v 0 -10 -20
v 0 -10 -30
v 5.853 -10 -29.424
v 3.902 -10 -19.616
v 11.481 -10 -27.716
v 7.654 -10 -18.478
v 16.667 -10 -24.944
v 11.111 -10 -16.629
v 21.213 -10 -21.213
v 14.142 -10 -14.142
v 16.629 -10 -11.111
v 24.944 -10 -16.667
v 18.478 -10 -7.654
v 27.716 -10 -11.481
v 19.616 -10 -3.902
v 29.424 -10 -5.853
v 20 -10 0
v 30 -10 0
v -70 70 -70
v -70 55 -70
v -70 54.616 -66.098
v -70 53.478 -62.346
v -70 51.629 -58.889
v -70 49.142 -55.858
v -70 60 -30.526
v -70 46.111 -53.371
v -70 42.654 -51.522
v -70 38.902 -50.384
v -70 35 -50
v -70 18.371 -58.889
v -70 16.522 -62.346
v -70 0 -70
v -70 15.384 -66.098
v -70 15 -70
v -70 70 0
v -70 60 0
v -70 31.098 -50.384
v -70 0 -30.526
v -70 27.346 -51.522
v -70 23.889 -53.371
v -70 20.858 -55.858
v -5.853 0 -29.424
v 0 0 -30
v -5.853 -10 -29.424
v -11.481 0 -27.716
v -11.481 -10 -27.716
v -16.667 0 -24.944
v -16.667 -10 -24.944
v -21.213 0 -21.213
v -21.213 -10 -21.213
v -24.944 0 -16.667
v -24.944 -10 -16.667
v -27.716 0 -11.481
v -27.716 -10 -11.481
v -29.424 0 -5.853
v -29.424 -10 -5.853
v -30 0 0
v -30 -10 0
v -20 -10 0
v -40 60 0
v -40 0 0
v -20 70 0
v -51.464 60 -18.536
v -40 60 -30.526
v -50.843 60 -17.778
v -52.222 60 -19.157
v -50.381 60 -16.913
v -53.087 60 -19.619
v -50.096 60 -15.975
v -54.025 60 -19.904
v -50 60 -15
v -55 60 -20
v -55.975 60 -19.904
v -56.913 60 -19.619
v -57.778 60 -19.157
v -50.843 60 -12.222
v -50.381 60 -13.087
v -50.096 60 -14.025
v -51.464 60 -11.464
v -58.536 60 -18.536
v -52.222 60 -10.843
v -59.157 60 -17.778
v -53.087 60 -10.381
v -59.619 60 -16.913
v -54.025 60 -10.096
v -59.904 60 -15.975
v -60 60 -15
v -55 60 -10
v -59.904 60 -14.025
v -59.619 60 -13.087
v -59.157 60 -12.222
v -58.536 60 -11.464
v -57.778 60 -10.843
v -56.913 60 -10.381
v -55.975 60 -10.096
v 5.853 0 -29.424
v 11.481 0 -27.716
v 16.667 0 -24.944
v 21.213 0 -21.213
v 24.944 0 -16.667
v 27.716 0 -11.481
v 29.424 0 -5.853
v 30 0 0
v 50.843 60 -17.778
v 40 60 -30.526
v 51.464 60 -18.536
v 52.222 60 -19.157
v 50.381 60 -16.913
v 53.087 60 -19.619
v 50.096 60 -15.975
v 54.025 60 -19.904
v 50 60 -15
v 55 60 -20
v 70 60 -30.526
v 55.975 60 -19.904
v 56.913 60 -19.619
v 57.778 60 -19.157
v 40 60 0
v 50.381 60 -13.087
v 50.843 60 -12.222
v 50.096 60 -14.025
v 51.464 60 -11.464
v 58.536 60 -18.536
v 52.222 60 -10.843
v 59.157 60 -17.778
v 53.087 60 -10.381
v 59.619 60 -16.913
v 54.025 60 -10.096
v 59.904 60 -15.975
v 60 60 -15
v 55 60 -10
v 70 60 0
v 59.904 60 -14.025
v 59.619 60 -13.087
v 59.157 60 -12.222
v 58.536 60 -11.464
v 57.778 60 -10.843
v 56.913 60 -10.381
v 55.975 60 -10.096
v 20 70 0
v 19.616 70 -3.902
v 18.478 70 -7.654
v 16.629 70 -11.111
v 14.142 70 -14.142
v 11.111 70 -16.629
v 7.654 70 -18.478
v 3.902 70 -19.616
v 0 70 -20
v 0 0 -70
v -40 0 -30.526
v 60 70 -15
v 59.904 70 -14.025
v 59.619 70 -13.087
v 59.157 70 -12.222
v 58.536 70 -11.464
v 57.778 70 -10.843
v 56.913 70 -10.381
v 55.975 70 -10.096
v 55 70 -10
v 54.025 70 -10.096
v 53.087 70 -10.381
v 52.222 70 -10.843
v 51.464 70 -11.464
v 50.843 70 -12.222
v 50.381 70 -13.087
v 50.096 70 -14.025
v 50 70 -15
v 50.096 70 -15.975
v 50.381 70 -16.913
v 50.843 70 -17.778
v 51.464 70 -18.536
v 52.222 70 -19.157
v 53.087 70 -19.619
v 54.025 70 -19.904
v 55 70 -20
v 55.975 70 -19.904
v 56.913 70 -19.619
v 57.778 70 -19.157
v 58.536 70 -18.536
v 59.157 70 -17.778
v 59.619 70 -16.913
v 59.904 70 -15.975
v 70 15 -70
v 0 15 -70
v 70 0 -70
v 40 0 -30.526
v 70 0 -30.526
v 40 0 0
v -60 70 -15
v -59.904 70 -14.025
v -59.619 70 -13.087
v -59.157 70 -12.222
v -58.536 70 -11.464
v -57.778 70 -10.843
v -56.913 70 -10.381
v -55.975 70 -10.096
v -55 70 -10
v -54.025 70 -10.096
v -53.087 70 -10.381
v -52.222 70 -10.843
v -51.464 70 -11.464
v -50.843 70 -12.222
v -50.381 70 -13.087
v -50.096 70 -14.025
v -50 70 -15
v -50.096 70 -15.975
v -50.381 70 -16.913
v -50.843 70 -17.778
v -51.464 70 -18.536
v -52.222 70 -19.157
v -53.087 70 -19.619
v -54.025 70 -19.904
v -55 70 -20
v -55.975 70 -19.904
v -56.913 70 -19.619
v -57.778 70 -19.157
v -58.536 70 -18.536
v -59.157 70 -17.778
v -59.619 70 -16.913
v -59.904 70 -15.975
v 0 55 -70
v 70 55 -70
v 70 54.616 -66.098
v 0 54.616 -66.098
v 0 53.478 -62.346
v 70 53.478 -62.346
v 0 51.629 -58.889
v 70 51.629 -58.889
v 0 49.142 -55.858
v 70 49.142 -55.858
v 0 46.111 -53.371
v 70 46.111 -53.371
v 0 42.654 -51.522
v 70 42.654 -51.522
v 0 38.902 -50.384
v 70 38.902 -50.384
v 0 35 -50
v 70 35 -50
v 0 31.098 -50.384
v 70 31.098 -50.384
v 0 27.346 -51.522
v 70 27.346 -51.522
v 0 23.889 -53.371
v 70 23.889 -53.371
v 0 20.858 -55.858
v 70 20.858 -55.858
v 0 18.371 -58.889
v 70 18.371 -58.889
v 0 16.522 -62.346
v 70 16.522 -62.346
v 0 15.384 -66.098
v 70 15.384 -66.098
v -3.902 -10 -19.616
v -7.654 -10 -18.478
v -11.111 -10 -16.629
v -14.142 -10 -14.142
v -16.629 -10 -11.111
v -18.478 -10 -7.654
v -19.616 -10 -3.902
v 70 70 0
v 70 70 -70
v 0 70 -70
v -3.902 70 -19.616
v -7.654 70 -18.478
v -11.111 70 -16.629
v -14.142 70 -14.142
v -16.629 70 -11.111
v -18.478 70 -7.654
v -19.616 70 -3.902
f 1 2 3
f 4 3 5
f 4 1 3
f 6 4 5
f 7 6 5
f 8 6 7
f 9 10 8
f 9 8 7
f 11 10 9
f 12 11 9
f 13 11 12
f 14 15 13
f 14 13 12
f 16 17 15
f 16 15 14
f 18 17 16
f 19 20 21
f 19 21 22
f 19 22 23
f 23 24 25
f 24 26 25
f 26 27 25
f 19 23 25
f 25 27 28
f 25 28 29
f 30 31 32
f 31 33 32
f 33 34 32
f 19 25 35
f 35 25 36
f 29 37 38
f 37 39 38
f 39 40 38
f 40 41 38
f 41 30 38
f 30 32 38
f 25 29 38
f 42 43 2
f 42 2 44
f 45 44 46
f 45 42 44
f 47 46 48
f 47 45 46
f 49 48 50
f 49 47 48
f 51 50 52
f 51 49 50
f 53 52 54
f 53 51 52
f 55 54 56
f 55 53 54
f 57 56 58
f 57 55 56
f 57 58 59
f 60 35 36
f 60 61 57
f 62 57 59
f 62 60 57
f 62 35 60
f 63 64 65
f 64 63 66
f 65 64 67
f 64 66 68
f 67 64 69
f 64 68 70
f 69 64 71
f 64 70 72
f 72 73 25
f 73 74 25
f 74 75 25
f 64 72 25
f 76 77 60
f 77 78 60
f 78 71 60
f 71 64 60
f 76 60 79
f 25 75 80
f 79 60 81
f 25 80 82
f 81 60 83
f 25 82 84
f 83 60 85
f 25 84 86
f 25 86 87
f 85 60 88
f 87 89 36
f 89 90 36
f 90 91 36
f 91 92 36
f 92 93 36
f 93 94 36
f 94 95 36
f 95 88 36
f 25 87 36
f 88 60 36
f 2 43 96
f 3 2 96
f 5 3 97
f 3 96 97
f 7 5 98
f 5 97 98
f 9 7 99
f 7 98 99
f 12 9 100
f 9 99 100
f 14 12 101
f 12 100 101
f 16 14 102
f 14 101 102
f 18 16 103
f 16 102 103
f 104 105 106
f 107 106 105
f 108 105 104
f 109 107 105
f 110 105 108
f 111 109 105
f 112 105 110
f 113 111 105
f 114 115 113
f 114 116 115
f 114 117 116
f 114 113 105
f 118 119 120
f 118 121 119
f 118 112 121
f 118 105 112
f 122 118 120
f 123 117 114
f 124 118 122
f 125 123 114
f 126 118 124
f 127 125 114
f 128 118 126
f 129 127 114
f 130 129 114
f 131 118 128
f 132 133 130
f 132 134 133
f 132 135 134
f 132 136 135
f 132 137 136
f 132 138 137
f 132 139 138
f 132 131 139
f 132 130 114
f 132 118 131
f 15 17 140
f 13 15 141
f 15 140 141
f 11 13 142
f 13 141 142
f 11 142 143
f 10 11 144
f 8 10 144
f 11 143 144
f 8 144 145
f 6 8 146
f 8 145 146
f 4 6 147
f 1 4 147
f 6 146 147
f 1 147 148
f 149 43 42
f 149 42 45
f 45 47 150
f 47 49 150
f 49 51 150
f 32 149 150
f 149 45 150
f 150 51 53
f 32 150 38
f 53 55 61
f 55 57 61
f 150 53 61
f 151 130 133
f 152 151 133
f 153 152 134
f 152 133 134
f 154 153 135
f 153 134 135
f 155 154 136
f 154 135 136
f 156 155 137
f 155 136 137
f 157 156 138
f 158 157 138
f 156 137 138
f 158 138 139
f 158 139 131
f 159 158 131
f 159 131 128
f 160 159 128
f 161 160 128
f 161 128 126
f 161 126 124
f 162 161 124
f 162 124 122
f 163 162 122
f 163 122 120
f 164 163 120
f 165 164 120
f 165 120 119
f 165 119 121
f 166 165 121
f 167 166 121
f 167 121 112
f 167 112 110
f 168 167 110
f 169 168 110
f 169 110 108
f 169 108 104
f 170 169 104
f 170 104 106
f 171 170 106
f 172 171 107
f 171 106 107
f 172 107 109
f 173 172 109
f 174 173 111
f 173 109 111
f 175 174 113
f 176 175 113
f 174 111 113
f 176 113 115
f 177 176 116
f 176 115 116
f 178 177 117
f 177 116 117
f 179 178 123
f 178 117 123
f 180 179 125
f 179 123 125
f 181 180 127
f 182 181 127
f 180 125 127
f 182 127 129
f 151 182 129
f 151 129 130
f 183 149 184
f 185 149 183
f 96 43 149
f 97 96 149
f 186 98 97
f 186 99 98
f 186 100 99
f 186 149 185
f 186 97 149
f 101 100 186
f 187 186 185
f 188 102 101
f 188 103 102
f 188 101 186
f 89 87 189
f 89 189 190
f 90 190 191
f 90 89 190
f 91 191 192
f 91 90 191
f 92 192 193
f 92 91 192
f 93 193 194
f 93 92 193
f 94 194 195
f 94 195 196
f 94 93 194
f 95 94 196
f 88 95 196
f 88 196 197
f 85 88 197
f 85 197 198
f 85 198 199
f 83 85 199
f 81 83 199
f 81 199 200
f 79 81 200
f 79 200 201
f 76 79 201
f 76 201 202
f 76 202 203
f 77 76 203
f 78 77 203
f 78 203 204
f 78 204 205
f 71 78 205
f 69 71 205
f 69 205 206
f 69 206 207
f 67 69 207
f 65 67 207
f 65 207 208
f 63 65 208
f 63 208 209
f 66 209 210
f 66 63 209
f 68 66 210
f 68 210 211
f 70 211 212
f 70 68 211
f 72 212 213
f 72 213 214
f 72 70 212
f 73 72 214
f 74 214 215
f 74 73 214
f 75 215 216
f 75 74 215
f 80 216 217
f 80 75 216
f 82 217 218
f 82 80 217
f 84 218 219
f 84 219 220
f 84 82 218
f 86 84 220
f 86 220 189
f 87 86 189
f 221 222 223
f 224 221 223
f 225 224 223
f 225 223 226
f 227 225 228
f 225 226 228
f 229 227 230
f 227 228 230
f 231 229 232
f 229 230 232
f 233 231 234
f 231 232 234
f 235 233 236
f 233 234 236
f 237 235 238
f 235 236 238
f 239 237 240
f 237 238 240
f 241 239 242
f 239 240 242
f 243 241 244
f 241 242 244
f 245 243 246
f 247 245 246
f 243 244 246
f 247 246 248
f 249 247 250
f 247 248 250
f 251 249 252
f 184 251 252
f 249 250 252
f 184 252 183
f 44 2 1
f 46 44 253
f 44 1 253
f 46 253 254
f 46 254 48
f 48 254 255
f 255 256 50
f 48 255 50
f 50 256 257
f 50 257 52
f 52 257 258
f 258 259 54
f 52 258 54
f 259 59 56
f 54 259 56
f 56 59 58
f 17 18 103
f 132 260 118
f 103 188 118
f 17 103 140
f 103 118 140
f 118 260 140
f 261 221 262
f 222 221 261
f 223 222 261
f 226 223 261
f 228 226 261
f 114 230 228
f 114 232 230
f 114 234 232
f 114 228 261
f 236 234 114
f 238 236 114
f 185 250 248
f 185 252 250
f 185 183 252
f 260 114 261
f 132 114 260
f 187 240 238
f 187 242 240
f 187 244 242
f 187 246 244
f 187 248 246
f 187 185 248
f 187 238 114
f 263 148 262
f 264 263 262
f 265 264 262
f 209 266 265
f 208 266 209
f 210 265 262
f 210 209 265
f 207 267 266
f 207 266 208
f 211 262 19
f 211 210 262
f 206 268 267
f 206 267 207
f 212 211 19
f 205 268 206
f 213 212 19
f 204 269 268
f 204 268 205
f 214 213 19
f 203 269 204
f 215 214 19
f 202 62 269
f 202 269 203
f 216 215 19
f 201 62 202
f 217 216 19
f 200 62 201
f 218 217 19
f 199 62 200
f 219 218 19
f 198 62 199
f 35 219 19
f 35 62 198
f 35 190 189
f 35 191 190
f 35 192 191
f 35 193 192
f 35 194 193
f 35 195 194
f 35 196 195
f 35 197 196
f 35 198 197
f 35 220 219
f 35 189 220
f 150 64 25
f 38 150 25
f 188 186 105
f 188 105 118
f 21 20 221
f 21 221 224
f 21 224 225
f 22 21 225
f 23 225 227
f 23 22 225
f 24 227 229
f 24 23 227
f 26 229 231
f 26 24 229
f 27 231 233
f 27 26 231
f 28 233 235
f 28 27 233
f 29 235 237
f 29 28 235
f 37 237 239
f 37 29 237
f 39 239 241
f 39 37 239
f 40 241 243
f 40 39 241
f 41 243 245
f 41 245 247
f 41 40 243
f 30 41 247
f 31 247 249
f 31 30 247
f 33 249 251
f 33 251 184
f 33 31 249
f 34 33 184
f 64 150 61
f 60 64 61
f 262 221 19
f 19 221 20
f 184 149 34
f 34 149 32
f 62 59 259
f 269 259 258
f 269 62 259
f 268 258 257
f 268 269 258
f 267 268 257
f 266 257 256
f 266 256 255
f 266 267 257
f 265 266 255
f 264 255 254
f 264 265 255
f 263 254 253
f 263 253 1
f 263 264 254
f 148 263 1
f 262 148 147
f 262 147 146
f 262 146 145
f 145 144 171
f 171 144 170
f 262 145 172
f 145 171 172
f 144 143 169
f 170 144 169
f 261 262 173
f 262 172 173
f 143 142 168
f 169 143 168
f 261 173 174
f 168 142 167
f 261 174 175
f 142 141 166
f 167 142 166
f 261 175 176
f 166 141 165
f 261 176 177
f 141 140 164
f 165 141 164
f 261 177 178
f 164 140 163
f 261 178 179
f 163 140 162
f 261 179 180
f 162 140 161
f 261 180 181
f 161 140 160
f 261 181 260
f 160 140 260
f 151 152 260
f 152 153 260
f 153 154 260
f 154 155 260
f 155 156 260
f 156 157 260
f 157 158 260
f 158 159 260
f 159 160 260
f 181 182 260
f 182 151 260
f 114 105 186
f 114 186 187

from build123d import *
from build123d import SkipClean  # not in build123d's __all__

# Parameters (mm, degrees)
F1_DEPTH = 70
F2_W     = 30
F2_H     = 30.5260747812
F3_DEPTH = 60
F4_R     = 5
F5_DEPTH = 10.001
F6_R     = 20
F7_DEPTH = 70.001
F9_DEPTH = 10


with BuildPart() as f1:
    # F0 (on Front) → F1 (new body)
    with BuildSketch(Plane.XZ):
        with BuildLine():
            Line((0, -20), (0, -70))
            Line((0, -70), (70, -70))
            Line((70, -70), (70, 0))
            Line((70, 0), (20, 0))
            ThreePointArc((20, 0), (14.1421356237, -14.1421356237), (0, -20))
        make_face()
    extrude(amount=-F1_DEPTH)

    # F2 (on face) → F3 (cut)
    with BuildSketch(Plane.XZ):
        with Locations((55, -15.2630373906)):
            Rectangle(F2_W, F2_H)
    extrude(amount=-F3_DEPTH, mode=Mode.SUBTRACT)

    # F4 (on face) → F5 (cut, through all)
    with BuildSketch(Plane.XZ.offset(-60)):
        with Locations((55, -15)):
            Circle(F4_R)
    extrude(amount=-F5_DEPTH, mode=Mode.SUBTRACT)

    # F6 (on face) → F7 (cut, through all)
    with BuildSketch(Plane.YZ.offset(70)):
        with Locations((35, -70)):
            Circle(F6_R)
    extrude(amount=-F7_DEPTH, mode=Mode.SUBTRACT)

    # F8 (on face) → F9 (join)
    with BuildSketch(Plane.XZ):
        with BuildLine():
            ThreePointArc((20, 0), (14.1421356237, -14.1421356237), (0, -20))
            Line((0, -20), (0, -30))
            ThreePointArc((0, -30), (21.2132034356, -21.2132034356), (30, 0))
            Line((30, 0), (20, 0))
        make_face()
    extrude(amount=F9_DEPTH)

    # F10: F1 across plane


with BuildPart() as f1_1:
    add(f1.part, clean=False)
    with SkipClean():  # cleaning this boolean's faces spoils the solid; the shape is the same uncleaned
        add(f1.part.mirror(Plane.YZ), clean=False)


solid = f1_1.part
